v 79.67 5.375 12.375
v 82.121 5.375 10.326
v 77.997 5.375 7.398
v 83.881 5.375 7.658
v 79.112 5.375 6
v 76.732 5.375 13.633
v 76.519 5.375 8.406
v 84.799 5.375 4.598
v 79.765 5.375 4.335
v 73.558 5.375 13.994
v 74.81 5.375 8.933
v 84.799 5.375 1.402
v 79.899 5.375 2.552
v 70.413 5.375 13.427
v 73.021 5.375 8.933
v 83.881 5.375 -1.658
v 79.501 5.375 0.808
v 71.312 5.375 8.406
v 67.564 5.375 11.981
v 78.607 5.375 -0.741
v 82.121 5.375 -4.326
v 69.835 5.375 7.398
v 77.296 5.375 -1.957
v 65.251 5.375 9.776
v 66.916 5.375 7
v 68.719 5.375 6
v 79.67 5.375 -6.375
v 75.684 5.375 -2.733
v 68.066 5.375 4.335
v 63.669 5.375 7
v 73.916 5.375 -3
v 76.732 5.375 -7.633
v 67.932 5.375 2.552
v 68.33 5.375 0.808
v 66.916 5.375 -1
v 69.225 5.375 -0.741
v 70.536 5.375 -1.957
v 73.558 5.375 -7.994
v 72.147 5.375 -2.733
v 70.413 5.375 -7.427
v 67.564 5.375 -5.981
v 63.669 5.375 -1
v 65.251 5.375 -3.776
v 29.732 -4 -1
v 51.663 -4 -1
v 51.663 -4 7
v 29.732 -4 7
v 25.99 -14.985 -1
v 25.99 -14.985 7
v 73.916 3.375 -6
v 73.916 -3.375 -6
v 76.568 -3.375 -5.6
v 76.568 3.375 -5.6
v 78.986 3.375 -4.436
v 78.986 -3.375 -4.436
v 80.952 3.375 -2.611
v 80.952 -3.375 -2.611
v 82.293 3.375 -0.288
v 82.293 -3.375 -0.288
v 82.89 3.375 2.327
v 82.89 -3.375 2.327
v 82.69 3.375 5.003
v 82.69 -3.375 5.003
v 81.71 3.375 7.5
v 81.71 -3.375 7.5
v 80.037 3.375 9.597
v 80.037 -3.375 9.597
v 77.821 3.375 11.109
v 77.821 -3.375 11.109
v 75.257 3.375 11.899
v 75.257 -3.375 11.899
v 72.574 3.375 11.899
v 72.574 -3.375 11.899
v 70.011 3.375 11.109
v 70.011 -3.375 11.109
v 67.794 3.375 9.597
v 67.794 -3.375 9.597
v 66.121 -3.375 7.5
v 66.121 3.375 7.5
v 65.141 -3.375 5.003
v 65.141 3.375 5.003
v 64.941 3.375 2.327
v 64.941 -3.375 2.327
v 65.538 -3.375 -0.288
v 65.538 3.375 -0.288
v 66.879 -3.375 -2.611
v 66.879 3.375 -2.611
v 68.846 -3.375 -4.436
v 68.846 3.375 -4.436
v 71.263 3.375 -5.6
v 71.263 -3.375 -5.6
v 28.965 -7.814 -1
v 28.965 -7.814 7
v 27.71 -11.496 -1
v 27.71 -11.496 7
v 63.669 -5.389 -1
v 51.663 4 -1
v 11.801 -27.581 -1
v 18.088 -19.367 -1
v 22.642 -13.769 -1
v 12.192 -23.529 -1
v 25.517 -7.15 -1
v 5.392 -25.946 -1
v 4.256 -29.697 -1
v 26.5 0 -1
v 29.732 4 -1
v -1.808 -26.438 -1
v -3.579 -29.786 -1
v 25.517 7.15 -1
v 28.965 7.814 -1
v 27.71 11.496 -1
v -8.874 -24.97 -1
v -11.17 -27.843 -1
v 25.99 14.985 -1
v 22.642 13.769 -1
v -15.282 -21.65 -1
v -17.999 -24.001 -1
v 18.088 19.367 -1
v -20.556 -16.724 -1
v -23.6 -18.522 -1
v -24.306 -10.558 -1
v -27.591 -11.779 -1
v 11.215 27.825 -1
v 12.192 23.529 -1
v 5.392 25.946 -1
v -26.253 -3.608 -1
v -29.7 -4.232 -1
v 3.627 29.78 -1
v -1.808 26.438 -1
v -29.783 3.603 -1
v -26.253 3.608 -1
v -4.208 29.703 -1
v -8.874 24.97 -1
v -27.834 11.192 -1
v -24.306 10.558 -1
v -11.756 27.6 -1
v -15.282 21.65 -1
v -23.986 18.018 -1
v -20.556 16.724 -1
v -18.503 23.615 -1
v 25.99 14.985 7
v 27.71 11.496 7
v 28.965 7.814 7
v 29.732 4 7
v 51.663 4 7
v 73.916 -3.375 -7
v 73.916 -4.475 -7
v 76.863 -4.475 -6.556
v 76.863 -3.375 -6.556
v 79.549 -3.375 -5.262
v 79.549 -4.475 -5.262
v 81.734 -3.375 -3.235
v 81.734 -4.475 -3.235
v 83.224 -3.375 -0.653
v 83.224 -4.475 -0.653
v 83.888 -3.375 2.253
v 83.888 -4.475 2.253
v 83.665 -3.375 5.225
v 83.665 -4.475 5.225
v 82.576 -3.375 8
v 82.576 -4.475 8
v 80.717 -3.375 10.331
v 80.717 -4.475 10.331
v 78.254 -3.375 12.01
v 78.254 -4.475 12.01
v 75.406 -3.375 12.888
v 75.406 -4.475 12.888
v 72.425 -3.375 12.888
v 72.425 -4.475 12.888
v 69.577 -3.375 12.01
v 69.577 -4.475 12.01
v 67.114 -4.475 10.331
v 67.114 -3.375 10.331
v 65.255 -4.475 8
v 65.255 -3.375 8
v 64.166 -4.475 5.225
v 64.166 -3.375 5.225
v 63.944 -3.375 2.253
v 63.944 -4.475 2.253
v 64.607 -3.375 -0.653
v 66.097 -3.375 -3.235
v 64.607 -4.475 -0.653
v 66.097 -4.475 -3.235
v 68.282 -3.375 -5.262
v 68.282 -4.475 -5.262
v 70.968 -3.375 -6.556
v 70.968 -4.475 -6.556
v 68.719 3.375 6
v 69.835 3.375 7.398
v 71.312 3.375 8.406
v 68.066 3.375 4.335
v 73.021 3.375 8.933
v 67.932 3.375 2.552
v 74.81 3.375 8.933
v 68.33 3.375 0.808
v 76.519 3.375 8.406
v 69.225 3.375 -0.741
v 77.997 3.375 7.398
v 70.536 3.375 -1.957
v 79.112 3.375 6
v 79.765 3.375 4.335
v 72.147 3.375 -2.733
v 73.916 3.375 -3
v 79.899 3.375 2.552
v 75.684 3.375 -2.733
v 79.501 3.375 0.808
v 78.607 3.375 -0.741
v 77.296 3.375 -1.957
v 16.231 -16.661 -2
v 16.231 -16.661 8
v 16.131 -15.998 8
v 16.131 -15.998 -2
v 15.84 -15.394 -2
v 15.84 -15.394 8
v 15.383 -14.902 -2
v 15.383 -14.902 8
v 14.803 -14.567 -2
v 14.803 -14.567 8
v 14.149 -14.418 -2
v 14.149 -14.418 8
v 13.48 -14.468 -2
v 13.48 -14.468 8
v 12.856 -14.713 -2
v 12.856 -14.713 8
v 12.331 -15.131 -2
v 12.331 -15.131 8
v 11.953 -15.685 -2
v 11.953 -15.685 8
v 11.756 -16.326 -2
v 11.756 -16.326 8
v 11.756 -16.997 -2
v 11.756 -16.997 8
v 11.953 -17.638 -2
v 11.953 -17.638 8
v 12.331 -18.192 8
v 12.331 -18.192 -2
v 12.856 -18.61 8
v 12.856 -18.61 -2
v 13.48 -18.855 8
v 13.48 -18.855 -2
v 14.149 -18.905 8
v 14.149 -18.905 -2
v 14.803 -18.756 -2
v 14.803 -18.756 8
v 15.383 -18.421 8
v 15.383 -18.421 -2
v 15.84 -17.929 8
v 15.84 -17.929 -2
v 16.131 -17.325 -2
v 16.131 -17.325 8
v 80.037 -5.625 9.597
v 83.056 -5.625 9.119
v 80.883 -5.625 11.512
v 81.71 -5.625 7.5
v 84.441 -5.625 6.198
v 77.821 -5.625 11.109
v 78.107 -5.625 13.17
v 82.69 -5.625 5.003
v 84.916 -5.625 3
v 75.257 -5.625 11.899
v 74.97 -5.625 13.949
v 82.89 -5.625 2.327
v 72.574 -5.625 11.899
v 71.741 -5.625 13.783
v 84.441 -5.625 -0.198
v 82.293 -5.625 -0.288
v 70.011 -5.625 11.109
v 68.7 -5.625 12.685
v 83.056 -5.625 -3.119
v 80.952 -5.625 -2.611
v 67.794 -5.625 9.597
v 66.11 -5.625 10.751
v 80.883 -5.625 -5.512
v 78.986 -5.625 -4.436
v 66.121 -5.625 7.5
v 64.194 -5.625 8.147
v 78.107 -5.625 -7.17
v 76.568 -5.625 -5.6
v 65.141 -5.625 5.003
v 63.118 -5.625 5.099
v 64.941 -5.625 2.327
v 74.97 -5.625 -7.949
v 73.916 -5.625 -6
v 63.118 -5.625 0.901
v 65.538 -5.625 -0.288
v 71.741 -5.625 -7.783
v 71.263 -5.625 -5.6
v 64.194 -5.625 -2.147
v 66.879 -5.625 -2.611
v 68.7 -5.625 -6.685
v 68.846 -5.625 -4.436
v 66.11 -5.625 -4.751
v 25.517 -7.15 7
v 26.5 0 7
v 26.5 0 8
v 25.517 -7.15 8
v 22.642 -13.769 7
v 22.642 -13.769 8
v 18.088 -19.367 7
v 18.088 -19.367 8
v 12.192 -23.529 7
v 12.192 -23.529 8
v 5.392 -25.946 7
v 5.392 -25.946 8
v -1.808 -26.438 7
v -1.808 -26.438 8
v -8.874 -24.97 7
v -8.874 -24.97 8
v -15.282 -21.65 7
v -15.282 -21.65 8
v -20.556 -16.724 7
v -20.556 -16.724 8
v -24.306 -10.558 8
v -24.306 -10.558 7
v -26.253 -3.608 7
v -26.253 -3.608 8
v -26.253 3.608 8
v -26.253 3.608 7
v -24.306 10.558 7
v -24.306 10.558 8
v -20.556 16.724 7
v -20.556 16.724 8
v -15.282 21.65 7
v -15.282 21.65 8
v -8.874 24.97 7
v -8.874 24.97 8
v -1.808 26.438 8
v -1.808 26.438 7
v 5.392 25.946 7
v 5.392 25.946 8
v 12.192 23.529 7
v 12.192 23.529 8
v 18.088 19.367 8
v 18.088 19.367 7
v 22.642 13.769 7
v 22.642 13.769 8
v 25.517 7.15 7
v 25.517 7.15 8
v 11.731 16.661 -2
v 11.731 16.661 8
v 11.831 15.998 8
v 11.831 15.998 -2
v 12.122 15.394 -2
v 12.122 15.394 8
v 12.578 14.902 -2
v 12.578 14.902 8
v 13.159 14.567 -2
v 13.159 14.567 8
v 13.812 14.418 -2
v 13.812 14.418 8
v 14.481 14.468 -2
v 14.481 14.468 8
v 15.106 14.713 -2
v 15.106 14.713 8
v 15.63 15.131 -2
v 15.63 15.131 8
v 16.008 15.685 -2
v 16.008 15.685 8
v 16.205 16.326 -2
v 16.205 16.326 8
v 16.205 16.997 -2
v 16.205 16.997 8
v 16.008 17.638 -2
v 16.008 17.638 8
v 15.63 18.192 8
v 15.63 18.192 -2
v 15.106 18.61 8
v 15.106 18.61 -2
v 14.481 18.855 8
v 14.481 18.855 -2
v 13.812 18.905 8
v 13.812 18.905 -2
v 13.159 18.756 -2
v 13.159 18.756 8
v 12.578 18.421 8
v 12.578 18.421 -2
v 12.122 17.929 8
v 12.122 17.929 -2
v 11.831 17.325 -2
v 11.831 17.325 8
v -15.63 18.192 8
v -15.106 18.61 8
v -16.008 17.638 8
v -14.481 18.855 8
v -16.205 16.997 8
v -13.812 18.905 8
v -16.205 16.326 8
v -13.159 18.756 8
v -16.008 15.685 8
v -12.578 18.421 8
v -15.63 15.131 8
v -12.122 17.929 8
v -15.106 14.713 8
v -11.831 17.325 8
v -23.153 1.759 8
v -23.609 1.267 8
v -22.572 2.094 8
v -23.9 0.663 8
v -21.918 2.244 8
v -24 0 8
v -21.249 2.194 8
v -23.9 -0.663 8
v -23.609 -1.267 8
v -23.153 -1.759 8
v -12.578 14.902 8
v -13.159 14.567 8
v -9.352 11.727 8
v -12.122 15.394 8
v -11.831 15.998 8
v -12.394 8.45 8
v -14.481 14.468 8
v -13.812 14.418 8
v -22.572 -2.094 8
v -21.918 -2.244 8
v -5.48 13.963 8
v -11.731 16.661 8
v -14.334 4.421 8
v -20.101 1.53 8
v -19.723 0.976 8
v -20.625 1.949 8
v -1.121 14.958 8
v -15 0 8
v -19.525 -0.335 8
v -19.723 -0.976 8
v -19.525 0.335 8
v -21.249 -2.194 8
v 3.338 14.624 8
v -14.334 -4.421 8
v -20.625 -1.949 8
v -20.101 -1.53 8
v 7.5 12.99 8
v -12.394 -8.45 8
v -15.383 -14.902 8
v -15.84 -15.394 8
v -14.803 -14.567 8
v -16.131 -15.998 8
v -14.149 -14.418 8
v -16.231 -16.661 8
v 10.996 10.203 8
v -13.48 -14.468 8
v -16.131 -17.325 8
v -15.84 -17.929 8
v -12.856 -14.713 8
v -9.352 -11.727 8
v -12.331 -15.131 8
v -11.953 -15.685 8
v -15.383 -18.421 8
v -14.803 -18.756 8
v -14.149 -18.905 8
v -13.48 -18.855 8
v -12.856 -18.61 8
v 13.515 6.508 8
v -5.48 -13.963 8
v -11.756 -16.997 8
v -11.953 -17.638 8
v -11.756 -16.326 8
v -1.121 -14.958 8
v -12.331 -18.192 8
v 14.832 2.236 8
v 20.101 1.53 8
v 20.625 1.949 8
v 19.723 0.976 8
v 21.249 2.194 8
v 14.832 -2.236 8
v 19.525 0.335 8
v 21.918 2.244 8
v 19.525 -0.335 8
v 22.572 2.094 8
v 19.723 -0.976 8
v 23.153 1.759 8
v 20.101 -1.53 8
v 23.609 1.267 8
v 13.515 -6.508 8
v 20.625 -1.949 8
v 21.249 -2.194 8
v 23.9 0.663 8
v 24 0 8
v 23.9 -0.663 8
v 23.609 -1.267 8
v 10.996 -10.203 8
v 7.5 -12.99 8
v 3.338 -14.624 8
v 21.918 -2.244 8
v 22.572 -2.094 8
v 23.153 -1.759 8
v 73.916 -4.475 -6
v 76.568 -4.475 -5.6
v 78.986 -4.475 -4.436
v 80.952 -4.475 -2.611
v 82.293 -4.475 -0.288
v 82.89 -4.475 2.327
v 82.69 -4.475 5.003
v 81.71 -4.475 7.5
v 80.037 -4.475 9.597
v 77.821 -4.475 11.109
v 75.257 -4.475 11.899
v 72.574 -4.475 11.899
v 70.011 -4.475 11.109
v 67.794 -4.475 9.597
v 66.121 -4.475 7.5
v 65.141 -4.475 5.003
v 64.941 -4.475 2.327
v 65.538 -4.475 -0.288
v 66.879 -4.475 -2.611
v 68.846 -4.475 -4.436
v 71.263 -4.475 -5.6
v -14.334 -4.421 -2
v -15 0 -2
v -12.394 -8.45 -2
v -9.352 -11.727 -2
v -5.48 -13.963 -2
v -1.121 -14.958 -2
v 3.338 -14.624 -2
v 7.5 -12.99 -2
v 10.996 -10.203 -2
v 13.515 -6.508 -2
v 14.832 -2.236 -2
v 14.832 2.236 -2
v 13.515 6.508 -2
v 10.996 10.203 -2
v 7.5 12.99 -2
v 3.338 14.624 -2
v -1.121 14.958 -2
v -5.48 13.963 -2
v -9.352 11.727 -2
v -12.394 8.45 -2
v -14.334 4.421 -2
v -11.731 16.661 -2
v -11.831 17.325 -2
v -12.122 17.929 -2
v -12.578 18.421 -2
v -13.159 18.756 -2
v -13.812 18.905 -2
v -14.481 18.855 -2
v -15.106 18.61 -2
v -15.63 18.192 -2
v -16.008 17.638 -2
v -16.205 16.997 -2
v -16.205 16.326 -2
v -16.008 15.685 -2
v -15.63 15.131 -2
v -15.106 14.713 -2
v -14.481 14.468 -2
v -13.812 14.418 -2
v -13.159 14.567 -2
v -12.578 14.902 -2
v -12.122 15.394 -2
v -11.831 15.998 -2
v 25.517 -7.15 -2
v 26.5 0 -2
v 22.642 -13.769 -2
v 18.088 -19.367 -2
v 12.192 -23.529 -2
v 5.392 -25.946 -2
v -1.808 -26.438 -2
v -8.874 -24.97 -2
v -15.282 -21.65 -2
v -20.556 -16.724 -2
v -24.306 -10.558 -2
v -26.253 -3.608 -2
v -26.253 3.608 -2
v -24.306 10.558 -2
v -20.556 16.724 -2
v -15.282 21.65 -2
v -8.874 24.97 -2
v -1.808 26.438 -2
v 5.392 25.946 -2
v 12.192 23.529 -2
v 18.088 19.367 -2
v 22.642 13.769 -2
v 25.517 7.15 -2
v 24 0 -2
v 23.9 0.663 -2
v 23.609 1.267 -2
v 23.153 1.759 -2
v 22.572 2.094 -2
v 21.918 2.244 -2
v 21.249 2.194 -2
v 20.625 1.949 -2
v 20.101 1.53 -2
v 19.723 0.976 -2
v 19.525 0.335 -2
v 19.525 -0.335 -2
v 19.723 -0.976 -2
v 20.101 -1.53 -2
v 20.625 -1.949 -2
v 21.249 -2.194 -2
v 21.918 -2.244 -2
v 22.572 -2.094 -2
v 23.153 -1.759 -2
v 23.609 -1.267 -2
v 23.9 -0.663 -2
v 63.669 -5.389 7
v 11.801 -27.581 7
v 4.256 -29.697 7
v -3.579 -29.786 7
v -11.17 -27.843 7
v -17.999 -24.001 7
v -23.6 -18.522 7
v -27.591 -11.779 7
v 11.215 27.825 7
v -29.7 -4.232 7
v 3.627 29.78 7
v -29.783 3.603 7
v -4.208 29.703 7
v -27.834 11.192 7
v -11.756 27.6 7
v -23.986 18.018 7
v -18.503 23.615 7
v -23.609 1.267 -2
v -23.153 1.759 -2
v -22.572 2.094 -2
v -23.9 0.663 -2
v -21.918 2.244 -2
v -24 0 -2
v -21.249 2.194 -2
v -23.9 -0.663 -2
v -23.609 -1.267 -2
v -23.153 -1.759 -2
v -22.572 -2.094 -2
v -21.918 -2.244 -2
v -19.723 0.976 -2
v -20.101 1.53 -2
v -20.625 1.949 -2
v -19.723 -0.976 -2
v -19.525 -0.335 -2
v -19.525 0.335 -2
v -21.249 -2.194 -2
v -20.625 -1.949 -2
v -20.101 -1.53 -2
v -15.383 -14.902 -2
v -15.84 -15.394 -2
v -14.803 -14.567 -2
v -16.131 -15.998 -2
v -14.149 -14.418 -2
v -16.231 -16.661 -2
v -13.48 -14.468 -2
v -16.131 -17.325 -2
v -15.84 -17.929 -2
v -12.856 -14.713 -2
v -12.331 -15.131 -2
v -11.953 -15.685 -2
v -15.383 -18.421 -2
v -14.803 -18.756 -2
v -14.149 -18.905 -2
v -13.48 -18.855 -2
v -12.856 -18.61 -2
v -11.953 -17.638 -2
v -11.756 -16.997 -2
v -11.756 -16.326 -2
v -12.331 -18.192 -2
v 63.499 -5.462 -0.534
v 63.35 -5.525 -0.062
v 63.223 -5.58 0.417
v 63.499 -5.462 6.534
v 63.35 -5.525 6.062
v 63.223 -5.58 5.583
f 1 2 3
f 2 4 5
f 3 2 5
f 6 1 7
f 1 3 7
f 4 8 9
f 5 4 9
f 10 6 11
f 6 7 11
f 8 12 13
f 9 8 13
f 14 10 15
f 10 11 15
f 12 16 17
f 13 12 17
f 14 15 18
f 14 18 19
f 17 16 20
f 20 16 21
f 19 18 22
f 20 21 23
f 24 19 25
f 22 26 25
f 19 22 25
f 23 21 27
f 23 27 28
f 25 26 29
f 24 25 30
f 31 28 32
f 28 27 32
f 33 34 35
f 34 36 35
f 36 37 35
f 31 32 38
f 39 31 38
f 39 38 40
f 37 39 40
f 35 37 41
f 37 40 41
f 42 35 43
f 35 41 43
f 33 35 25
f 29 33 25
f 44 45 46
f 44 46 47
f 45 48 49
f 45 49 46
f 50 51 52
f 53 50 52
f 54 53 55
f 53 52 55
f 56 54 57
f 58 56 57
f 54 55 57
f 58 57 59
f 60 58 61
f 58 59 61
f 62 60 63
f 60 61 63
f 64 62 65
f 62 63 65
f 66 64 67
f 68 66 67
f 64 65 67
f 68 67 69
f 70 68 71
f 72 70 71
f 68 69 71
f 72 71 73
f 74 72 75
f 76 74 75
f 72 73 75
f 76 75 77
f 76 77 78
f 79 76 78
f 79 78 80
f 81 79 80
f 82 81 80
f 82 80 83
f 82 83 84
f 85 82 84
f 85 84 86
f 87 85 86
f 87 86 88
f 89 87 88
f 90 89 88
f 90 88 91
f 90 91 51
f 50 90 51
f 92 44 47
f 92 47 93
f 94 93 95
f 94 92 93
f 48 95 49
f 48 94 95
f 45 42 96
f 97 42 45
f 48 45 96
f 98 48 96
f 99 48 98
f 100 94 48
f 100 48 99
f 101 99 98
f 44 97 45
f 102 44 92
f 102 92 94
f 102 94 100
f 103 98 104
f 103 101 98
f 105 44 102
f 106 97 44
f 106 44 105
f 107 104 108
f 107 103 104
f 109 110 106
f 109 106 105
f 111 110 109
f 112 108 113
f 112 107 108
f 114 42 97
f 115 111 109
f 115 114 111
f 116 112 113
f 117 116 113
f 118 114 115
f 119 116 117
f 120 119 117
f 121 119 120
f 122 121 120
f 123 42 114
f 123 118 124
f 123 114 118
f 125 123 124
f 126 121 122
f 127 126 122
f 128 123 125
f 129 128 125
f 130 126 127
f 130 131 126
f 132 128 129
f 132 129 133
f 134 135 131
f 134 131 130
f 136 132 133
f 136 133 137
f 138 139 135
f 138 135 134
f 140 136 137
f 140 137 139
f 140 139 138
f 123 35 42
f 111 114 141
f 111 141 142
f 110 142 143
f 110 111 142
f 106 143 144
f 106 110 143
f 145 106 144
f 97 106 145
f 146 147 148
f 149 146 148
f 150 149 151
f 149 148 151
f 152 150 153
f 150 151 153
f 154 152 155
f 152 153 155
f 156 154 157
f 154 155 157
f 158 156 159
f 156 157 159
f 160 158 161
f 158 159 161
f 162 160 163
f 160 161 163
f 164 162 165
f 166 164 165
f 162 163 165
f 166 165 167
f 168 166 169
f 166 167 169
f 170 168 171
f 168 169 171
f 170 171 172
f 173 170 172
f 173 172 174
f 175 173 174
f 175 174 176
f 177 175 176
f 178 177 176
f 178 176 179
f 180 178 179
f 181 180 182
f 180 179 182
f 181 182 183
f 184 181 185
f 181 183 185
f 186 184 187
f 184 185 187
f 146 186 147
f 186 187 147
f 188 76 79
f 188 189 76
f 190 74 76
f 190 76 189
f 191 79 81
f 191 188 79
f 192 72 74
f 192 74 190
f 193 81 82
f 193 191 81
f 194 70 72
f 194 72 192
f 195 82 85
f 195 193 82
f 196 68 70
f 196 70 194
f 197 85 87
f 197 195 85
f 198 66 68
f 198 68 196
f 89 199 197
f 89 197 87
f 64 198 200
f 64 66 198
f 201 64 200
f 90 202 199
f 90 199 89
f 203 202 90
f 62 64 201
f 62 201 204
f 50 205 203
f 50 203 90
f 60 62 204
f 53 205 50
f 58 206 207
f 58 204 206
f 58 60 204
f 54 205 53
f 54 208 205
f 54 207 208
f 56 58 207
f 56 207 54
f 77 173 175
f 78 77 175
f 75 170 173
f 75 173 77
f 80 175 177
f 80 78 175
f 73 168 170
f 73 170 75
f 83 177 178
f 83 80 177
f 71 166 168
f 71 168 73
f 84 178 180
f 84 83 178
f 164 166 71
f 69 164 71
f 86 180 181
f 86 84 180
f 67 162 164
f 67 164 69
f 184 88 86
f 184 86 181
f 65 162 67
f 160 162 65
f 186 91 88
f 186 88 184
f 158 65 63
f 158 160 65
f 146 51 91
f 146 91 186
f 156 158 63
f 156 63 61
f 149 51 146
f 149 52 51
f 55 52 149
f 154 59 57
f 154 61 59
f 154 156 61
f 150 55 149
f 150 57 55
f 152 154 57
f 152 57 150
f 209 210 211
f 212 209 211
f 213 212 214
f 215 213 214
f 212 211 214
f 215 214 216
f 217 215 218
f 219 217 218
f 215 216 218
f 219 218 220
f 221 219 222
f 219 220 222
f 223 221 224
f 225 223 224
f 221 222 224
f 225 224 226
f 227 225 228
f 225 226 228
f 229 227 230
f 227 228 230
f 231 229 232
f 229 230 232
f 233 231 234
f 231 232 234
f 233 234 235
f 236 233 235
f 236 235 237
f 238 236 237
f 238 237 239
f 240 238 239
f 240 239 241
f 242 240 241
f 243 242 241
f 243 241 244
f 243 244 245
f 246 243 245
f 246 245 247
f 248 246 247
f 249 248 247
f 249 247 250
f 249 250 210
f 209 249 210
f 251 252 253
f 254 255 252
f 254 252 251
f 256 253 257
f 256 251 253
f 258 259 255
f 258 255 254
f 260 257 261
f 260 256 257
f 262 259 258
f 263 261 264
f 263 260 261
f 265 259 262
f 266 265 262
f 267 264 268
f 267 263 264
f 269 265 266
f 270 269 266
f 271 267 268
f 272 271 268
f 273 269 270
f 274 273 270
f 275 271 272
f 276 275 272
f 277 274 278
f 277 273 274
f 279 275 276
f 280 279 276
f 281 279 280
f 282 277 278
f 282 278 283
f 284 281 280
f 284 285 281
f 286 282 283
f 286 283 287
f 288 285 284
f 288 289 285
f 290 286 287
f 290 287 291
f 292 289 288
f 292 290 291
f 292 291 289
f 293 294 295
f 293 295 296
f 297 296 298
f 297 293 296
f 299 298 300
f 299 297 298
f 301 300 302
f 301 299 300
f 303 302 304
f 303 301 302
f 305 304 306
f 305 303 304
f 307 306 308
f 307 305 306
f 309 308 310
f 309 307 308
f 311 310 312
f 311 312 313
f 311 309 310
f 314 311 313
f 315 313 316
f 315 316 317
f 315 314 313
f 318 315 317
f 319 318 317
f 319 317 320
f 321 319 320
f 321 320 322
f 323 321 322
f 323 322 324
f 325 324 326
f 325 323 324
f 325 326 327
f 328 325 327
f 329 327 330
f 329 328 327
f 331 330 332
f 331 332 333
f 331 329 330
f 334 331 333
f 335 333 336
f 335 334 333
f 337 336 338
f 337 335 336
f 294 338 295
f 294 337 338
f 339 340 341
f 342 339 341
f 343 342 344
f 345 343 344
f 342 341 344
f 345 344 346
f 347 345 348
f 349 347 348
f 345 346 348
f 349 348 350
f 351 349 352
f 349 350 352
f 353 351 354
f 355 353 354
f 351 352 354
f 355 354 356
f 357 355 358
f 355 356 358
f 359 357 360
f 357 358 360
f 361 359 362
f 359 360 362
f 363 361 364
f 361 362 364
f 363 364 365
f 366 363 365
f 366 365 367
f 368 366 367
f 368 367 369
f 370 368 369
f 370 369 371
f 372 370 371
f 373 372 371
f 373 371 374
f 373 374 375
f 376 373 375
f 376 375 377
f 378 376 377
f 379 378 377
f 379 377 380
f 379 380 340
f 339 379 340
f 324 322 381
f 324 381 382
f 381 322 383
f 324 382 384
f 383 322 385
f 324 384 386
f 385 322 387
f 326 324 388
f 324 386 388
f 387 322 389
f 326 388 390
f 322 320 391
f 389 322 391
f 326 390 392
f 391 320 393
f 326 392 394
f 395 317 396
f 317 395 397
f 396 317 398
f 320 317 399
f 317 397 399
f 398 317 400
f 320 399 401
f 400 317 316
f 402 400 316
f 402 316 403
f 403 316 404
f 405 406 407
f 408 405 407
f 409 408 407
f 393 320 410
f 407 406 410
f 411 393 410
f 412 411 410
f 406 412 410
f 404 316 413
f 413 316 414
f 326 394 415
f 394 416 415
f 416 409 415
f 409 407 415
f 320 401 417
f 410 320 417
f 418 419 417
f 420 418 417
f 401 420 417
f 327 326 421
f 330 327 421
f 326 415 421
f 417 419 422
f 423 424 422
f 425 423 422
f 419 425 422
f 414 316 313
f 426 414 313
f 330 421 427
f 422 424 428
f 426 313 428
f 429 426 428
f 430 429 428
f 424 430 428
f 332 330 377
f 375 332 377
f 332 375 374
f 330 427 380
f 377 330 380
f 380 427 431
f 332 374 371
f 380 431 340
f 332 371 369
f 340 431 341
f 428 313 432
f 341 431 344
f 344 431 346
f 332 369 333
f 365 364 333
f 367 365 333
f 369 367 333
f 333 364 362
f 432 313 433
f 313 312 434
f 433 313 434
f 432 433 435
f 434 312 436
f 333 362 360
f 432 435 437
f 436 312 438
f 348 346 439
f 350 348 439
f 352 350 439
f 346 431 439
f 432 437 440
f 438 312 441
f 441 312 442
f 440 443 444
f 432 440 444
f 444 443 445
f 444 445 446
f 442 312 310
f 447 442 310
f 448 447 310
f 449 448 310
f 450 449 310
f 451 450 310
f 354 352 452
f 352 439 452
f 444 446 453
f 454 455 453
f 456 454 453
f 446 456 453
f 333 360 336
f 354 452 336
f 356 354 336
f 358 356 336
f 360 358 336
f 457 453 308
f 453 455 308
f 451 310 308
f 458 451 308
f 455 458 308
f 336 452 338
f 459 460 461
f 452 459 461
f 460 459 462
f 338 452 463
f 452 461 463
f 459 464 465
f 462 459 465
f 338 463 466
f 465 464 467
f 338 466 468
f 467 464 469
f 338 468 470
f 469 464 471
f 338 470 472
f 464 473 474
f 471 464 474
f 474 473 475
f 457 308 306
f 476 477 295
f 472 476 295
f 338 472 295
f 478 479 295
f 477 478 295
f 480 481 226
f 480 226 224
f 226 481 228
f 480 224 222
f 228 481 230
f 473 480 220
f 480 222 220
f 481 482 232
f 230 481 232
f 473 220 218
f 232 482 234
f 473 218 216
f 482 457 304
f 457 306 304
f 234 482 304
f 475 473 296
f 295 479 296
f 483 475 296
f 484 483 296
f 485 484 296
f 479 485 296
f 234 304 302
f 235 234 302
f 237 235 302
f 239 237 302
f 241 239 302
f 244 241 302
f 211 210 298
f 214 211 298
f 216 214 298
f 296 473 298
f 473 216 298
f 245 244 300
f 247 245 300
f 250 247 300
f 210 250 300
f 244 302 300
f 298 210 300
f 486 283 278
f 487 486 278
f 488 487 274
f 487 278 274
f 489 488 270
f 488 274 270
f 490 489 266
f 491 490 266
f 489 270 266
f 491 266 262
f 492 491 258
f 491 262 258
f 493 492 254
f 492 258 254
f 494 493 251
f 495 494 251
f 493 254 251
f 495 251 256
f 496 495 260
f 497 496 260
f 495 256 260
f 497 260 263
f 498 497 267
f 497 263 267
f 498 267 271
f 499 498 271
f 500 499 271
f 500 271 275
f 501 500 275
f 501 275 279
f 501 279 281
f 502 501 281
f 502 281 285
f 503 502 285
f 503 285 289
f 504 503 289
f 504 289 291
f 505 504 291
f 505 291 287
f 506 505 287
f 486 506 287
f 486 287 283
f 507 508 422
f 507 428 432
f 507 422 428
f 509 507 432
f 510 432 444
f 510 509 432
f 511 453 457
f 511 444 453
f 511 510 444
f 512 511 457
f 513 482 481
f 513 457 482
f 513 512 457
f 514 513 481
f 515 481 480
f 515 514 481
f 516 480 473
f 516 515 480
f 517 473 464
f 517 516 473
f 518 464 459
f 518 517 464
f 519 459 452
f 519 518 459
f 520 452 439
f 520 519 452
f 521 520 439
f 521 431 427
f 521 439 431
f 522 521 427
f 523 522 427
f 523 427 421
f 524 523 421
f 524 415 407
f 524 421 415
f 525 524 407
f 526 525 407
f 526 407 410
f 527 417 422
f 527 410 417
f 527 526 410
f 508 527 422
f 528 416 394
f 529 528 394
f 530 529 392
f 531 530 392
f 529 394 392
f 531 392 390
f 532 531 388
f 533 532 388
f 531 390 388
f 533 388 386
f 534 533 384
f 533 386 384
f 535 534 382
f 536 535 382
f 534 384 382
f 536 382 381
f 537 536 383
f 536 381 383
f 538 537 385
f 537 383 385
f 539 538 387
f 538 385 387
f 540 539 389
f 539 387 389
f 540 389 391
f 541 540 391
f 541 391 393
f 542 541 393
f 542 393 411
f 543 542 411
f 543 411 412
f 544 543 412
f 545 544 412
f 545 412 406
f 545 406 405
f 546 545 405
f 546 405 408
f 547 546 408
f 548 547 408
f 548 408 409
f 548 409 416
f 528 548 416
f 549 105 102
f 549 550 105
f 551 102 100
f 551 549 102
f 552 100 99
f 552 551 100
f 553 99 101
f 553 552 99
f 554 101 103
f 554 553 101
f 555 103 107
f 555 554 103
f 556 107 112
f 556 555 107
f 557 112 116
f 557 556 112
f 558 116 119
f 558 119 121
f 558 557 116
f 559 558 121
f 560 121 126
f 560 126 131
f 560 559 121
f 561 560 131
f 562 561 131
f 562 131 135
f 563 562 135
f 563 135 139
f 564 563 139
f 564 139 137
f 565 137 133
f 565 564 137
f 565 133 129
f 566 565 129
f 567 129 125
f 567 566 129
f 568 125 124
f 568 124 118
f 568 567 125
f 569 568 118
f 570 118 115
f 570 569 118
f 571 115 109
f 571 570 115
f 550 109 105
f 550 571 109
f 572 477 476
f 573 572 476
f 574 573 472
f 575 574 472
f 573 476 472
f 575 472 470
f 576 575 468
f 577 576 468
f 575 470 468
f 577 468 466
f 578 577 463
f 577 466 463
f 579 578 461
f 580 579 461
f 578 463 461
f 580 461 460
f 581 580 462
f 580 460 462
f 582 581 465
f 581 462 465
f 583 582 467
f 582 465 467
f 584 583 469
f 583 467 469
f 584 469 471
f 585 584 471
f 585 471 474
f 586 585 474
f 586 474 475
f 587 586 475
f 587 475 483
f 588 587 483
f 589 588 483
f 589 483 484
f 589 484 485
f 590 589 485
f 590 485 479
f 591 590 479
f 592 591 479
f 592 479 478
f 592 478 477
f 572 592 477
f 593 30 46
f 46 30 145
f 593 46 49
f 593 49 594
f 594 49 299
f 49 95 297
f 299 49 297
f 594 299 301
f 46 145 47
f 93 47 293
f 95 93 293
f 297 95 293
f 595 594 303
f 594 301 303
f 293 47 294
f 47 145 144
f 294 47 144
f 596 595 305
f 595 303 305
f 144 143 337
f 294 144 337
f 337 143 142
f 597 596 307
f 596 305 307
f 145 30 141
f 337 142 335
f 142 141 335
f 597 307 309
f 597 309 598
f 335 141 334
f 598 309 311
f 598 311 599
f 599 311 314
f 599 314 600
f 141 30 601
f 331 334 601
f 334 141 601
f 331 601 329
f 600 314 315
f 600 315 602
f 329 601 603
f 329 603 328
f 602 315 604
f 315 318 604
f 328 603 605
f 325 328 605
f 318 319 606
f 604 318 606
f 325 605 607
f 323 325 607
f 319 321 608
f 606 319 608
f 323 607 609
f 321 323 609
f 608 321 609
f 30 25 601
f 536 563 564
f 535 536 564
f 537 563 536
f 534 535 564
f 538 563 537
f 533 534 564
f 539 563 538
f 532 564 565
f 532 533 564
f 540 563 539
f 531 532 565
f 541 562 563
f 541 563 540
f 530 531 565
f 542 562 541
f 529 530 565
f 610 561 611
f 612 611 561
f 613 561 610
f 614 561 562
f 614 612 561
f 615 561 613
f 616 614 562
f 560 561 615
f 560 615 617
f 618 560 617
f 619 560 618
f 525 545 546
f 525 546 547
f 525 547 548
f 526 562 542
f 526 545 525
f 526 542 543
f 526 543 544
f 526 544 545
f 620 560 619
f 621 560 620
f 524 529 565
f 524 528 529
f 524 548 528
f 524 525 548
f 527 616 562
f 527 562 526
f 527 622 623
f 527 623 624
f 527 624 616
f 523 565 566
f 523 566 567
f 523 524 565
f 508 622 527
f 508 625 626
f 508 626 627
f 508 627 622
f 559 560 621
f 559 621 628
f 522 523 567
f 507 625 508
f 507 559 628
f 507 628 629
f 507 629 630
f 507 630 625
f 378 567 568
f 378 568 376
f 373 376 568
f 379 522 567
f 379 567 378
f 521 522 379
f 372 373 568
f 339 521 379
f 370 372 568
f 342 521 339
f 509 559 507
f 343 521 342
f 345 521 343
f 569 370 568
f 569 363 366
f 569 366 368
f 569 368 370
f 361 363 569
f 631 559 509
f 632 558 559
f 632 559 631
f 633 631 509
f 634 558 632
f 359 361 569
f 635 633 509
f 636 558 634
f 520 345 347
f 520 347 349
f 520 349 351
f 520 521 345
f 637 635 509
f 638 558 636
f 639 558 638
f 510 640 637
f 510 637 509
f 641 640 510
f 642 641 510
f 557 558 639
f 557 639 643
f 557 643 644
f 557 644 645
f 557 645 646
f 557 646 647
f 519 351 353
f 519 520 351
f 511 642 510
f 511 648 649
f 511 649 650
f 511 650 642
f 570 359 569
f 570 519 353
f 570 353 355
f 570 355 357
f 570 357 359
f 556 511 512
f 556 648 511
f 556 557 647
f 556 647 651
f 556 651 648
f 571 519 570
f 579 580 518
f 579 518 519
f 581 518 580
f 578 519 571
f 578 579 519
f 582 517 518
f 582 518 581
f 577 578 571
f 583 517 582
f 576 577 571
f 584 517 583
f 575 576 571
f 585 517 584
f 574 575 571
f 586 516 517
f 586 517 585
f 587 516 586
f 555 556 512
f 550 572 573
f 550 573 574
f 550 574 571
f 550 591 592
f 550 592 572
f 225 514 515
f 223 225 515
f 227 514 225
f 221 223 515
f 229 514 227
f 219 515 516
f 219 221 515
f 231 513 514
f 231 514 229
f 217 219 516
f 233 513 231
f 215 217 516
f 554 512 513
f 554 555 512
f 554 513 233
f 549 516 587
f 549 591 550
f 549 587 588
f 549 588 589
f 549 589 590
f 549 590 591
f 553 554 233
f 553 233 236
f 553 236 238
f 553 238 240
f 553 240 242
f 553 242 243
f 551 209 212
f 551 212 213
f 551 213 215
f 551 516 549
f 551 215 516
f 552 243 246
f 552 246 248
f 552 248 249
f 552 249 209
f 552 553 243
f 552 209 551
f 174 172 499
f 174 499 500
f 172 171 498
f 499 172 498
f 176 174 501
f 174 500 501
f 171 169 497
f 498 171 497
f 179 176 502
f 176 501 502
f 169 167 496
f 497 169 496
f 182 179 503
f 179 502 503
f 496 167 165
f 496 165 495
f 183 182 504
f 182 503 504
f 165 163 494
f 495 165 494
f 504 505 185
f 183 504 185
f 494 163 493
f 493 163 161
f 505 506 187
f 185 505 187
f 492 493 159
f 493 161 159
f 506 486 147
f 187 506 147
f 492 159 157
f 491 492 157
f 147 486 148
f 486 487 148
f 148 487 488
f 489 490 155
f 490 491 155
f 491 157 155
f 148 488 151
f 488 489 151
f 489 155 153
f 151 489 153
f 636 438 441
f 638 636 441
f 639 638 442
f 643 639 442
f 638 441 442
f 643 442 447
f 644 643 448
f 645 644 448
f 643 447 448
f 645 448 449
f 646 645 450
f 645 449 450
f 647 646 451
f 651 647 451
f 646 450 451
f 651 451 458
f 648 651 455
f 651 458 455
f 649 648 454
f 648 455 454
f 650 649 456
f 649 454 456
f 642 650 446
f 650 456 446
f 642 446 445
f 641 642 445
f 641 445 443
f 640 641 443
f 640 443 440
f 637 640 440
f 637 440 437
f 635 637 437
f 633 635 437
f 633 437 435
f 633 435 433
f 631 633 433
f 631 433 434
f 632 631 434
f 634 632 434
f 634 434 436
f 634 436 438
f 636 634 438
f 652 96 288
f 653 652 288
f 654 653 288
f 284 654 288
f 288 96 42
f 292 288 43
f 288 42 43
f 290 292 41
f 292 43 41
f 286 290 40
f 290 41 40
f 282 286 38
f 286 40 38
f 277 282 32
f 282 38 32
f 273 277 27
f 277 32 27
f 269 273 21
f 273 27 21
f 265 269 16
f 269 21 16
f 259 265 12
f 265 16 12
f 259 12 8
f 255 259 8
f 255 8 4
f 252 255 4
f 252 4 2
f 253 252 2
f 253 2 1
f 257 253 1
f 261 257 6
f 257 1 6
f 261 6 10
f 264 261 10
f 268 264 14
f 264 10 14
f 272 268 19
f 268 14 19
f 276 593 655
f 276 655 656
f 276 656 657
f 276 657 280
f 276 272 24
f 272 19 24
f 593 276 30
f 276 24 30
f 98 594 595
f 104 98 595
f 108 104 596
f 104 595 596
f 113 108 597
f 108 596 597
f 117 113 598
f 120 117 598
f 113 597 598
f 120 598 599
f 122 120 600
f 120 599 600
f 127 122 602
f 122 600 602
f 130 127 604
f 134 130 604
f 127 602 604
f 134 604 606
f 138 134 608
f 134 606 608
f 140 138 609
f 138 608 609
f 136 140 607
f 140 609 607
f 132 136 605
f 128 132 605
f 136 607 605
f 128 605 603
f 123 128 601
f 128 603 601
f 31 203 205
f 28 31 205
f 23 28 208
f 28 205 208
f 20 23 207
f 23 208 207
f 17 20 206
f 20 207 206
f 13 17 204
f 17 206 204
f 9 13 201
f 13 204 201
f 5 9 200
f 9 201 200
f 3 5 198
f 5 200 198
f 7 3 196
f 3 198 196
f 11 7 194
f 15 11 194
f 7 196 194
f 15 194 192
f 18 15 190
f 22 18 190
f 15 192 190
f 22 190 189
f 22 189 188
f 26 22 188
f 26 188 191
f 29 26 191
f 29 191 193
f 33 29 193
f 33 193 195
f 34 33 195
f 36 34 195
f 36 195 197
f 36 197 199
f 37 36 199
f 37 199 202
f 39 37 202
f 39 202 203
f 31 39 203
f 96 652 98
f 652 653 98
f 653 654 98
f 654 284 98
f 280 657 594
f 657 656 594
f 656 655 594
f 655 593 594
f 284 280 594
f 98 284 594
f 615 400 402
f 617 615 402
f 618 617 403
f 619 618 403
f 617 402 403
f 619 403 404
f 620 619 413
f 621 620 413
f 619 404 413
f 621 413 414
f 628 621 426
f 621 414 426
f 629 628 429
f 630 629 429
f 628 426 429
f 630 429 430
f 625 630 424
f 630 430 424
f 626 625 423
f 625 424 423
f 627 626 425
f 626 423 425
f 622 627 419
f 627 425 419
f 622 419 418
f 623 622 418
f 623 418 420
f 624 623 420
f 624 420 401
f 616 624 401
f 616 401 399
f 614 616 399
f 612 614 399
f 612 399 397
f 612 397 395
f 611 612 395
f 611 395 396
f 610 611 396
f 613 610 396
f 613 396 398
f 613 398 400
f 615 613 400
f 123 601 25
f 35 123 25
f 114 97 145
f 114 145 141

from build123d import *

# Parameters (mm, degrees)
SKETCH_1_R               = 30
EXTRUDE_1_DEPTH          = 3
SKETCH_2_W               = 11
SKETCH_2_H               = 11
EXTRUDE_2_DEPTH          = 4
SKETCH_4_R               = 6
CUT_EXTRUDE_1_DEPTH      = 25
SKETCH_5_R               = 9
CUT_EXTRUDE_2_DEPTH      = 9
CUT_EXTRUDE_START        = 7.85
SKETCH_6_R               = 10
SKETCH_6_R_2             = 9
CUT_EXTRUDE_3_DEPTH      = 1.1
SKETCH_8_R               = 26.5
EXTRUDE_3_DEPTH          = 5
CUT_EXTRUDE_4_DEPTH      = 92.299851037
CUT_EXTRUDE_4_DEPTH_BACK = 92.299851037
SKETCH_7_R               = 15
SKETCH_10_R              = 2.25
CUT_EXTRUDE_5_DEPTH      = 17


with BuildPart() as part:
    # 草图1 → 凸台-拉伸1 (new body)
    with BuildSketch(Plane.XY):
        Circle(SKETCH_1_R)
    extrude(amount=EXTRUDE_1_DEPTH)



with BuildPart() as body_2:
    # 草图2 → 旋转1 (revolve)
    with BuildSketch(Plane.XY.offset(3)):
        with Locations((68.415621645, -0.125)):
            Rectangle(SKETCH_2_W, SKETCH_2_H)
    revolve(axis=Axis((73.915621645, 22.717290725, 3), (0, -1, 0)))


with BuildPart() as part_1:
    add(part.part)

    add(body_2.part)  # 凸台-拉伸2 merges body 2
    # 草图3 → 凸台-拉伸2 (add, symmetric)
    with BuildSketch(Plane.XY.offset(3)):
        with BuildLine():
            Line((11.214731114, 27.824985284), (66.915621645, 5.375))
            Line((66.915621645, 5.375), (66.915621645, -4))
            Line((66.915621645, -4), (11.80104521, -27.581430926))
            ThreePointArc((11.80104521, -27.581430926), (-29.998320441, -0.317444067), (11.214731114, 27.824985284))
        make_face()
    extrude(amount=EXTRUDE_2_DEPTH, both=True)

    # 草图4 → 切除-拉伸1 (cut)
    with BuildSketch(Plane.XZ.offset(5.625)):
        with Locations(Location((73.915621645, 3, 0), (0, 0, 270))):
            Circle(SKETCH_4_R)
    extrude(amount=-CUT_EXTRUDE_1_DEPTH, mode=Mode.SUBTRACT)

    # 草图5 → 切除-拉伸2 (cut)
    with BuildSketch(Plane.XZ.offset(5.625)):
        with Locations(Location((73.915621645, 3, 0), (0, 0, 270))):
            Circle(SKETCH_5_R)
    extrude(amount=-CUT_EXTRUDE_2_DEPTH, mode=Mode.SUBTRACT)

    # 草图6 → 切除-拉伸3 (cut)
    # profile 1 of 2: a face of its own
    with BuildSketch(Plane.XZ.offset(-3.375).offset(CUT_EXTRUDE_START)):
        with Locations(Location((73.915621645, 3, 0), (0, 0, 270))):
            Circle(SKETCH_6_R)
        with Locations(Location((73.915621645, 3, 0), (0, 0, 270))):
            Circle(SKETCH_6_R_2, mode=Mode.SUBTRACT)
    # profile 2 of 2: a face of its own
    with BuildSketch(Plane.XZ.offset(-3.375).offset(CUT_EXTRUDE_START)):
        with Locations(Location((73.915621645, 3, 0), (0, 0, 270))):
            Circle(SKETCH_6_R_2)
    extrude(amount=-CUT_EXTRUDE_3_DEPTH, mode=Mode.SUBTRACT)

    # 草图8 → 凸台-拉伸3 (add, symmetric)
    with BuildSketch(Plane(origin=(0, 0, 3), x_dir=(-1, 0, 0), z_dir=(0, 0, -1))):
        with Locations(Location((0, 0, 0), (0, 0, 180))):
            Circle(SKETCH_8_R)
    extrude(amount=EXTRUDE_3_DEPTH, both=True)

    # 草图7 → 切除-拉伸4 (cut, two sides: drawn at the far end of the back side and taken through both)
    with BuildSketch(Plane.XY.offset(7).offset(-CUT_EXTRUDE_4_DEPTH_BACK)):
        with Locations(Location((0, 0, 0), (0, 0, 180))):
            Circle(SKETCH_7_R)
        with BuildLine():
            Line((25.989694724, -14.984517615), (51.662735414, -4))
            Line((51.662735414, -4), (29.732137495, -4))
            ThreePointArc((29.732137495, -4), (28.397104663, -9.674939108), (25.989694724, -14.984517615))
        make_face()
        with BuildLine():
            Line((29.732137495, 4), (51.662735414, 4))
            Line((51.662735414, 4), (25.989694724, 14.984517615))
            ThreePointArc((25.989694724, 14.984517615), (28.397104663, 9.674939108), (29.732137495, 4))
        make_face()
    extrude(amount=CUT_EXTRUDE_4_DEPTH + CUT_EXTRUDE_4_DEPTH_BACK, mode=Mode.SUBTRACT)

    # 草图10 → 切除-拉伸5 (cut)
    with BuildSketch(Plane.XY.offset(8)):
        with Locations((21.75, 0)):
            Circle(SKETCH_10_R)
        with Locations((13.980630511, -16.661466638)):
            Circle(SKETCH_10_R)
        with Locations(Location((-21.75, 0, 0), (0, 0, 180))):
            Circle(SKETCH_10_R)
        with Locations(Location((-13.980630511, -16.661466638, 0), (0, 0, 180))):
            Circle(SKETCH_10_R)
        with Locations(Location((13.980630511, 16.661466638, 0), (0, 0, 180))):
            Circle(SKETCH_10_R)
        with Locations((-13.980630511, 16.661466638)):
            Circle(SKETCH_10_R)
    extrude(amount=-CUT_EXTRUDE_5_DEPTH, mode=Mode.SUBTRACT)


solid = part_1.part
